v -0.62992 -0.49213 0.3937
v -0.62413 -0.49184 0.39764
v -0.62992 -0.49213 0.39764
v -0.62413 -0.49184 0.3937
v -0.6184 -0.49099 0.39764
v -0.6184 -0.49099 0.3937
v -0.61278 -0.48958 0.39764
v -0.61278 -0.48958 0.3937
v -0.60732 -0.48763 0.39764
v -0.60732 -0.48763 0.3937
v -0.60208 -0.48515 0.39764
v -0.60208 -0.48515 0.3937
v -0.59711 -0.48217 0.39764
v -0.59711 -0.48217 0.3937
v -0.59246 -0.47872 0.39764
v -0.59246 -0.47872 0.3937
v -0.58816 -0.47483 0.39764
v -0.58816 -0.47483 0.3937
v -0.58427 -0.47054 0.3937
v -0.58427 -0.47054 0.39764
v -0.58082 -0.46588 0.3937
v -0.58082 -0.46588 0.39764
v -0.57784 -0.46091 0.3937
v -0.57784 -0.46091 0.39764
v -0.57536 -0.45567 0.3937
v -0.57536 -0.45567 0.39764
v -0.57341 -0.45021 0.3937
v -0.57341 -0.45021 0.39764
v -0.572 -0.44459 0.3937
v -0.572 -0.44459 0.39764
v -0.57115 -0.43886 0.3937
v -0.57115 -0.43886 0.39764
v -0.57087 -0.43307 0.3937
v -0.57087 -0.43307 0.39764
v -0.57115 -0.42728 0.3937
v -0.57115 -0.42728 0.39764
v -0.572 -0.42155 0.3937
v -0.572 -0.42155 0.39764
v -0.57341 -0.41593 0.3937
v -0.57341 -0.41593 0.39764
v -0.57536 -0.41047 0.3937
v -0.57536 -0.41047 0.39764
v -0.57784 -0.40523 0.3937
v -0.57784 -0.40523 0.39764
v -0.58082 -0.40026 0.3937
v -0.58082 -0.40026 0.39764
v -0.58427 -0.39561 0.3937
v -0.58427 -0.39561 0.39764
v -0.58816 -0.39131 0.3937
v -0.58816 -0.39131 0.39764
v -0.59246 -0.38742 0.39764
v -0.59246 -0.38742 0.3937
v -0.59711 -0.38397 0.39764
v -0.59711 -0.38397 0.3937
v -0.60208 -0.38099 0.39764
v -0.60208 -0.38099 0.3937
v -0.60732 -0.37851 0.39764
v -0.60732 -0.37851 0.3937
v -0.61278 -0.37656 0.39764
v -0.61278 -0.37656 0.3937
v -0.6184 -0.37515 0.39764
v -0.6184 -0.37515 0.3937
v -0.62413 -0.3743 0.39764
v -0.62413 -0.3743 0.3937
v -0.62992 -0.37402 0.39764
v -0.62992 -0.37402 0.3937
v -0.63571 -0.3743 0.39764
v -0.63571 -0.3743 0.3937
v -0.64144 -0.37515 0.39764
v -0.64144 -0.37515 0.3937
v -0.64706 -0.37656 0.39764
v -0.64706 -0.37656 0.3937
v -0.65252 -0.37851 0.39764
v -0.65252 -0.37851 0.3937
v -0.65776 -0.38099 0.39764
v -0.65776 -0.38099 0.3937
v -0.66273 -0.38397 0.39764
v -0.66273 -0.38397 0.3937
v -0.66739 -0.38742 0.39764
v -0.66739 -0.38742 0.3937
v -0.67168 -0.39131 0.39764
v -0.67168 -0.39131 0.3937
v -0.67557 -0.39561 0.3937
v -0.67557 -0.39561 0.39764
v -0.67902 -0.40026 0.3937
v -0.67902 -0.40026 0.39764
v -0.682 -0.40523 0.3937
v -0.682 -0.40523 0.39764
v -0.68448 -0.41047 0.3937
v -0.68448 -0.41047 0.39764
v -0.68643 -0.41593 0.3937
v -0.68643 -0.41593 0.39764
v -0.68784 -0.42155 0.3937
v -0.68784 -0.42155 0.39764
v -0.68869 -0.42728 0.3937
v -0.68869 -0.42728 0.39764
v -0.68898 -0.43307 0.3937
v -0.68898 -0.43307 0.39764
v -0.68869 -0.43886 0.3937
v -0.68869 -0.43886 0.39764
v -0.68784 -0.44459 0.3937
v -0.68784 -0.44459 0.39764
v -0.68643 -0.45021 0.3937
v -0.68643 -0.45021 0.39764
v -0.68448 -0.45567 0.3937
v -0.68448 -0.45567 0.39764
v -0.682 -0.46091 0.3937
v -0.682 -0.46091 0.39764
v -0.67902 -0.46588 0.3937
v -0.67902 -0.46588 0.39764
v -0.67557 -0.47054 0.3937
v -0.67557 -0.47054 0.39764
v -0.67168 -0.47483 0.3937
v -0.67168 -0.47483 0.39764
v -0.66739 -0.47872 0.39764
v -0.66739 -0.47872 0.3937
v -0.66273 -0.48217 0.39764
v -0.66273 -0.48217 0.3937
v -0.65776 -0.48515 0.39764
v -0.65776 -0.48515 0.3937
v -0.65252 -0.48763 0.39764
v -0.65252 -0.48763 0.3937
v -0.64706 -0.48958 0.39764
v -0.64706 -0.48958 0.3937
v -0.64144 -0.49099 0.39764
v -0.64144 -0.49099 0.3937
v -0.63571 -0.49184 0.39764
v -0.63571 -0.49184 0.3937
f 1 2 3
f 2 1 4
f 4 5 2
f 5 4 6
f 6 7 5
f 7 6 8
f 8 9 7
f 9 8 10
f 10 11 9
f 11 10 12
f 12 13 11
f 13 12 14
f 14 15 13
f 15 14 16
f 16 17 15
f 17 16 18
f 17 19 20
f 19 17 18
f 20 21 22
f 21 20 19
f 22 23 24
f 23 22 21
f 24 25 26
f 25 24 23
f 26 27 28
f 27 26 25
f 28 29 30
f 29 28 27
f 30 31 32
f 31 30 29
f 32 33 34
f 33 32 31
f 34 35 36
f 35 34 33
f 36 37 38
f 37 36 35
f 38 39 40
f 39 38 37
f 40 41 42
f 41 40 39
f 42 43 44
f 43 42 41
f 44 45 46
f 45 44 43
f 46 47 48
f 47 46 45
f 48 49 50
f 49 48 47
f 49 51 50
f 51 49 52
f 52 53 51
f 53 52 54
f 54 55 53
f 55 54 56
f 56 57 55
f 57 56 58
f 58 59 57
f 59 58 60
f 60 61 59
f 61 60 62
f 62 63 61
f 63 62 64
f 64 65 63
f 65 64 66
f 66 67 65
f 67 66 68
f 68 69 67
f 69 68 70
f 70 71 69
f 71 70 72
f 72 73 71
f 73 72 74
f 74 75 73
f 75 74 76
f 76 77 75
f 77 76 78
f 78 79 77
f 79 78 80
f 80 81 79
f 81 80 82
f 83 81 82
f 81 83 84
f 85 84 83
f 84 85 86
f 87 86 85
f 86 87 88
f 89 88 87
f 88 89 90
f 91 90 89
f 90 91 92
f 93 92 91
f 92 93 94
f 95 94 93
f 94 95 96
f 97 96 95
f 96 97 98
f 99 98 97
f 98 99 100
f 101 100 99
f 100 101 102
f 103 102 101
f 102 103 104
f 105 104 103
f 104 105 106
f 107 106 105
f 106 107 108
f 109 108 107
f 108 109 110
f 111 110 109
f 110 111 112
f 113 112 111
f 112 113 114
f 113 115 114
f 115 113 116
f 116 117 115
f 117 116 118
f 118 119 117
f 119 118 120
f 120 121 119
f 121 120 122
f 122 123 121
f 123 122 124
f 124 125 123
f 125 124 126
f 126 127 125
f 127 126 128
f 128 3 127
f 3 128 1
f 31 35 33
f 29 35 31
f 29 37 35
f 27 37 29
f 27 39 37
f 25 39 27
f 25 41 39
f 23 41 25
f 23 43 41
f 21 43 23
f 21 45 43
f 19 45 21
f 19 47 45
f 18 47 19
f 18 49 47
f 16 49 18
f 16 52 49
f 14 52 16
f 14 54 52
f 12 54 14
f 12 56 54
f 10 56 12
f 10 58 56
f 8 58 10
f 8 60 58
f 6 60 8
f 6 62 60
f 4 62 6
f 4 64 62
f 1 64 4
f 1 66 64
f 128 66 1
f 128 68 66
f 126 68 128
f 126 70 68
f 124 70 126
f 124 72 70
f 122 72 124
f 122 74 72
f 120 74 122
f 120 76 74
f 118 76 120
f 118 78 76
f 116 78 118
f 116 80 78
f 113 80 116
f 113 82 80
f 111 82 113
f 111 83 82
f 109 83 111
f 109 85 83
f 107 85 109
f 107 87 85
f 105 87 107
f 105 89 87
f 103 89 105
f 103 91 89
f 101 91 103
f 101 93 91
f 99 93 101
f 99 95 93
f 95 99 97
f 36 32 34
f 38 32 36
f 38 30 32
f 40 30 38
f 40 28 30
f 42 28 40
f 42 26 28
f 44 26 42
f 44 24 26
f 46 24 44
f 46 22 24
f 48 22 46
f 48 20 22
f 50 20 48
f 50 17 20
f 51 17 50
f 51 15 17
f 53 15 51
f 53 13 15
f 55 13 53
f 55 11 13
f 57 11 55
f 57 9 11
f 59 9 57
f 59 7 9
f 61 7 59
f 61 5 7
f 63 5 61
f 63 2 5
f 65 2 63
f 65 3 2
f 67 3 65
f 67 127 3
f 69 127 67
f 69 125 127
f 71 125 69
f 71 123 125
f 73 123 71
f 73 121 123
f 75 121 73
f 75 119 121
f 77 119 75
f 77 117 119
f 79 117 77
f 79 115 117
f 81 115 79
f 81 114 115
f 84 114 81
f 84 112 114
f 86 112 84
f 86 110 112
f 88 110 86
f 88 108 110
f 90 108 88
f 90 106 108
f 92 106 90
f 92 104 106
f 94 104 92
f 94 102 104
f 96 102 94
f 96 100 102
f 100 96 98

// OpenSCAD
// file: defines.scad
L = 4.5;  // Длина
W = 3.5;  // Ширина
H = 1.0;  // Высота
Hf = 0.04;  // Возвышение над платой (высота выводов)
e = 0.5;    // Шаг выводов

pin_fragments = 16;

scale = 1/2.54;
// main file
include <defines.scad>

font = "Liberation Sans";
/*font = "DejaVu";*/
/*font = "Abyssinica SIL";*/

f_x = -1.1;
f_y = 0.6;
f_dy = -0.6;
fscale = 0.05;
lab_h = 0.01;

// Label
scale(scale) color("White") rotate([0,0,-90]) {

    /*translate([f_x, f_y, H]) {
        scale([fscale,fscale,1])
        rotate([0,0,90])
        linear_extrude(height = lab_h, center=false) {
            text("BQ51050B", font = font);
        }
    }*/
    /*translate([f_x, f_y+f_dy, H]) {
        scale([fscale,fscale,1])
        linear_extrude(height = lab_h, center=false) {
            text("8452", font = font);
        }
    }
    translate([f_x, f_y+2*f_dy, H]) {
        scale([fscale,fscale,1])
        linear_extrude(height = lab_h, center=false) {
            text("3WZR", font = font);
        }
    }*/

    translate([1.1, -1.6, H]) {
        cylinder(r = 0.15, h = lab_h, $fn = 64);
    }

}
